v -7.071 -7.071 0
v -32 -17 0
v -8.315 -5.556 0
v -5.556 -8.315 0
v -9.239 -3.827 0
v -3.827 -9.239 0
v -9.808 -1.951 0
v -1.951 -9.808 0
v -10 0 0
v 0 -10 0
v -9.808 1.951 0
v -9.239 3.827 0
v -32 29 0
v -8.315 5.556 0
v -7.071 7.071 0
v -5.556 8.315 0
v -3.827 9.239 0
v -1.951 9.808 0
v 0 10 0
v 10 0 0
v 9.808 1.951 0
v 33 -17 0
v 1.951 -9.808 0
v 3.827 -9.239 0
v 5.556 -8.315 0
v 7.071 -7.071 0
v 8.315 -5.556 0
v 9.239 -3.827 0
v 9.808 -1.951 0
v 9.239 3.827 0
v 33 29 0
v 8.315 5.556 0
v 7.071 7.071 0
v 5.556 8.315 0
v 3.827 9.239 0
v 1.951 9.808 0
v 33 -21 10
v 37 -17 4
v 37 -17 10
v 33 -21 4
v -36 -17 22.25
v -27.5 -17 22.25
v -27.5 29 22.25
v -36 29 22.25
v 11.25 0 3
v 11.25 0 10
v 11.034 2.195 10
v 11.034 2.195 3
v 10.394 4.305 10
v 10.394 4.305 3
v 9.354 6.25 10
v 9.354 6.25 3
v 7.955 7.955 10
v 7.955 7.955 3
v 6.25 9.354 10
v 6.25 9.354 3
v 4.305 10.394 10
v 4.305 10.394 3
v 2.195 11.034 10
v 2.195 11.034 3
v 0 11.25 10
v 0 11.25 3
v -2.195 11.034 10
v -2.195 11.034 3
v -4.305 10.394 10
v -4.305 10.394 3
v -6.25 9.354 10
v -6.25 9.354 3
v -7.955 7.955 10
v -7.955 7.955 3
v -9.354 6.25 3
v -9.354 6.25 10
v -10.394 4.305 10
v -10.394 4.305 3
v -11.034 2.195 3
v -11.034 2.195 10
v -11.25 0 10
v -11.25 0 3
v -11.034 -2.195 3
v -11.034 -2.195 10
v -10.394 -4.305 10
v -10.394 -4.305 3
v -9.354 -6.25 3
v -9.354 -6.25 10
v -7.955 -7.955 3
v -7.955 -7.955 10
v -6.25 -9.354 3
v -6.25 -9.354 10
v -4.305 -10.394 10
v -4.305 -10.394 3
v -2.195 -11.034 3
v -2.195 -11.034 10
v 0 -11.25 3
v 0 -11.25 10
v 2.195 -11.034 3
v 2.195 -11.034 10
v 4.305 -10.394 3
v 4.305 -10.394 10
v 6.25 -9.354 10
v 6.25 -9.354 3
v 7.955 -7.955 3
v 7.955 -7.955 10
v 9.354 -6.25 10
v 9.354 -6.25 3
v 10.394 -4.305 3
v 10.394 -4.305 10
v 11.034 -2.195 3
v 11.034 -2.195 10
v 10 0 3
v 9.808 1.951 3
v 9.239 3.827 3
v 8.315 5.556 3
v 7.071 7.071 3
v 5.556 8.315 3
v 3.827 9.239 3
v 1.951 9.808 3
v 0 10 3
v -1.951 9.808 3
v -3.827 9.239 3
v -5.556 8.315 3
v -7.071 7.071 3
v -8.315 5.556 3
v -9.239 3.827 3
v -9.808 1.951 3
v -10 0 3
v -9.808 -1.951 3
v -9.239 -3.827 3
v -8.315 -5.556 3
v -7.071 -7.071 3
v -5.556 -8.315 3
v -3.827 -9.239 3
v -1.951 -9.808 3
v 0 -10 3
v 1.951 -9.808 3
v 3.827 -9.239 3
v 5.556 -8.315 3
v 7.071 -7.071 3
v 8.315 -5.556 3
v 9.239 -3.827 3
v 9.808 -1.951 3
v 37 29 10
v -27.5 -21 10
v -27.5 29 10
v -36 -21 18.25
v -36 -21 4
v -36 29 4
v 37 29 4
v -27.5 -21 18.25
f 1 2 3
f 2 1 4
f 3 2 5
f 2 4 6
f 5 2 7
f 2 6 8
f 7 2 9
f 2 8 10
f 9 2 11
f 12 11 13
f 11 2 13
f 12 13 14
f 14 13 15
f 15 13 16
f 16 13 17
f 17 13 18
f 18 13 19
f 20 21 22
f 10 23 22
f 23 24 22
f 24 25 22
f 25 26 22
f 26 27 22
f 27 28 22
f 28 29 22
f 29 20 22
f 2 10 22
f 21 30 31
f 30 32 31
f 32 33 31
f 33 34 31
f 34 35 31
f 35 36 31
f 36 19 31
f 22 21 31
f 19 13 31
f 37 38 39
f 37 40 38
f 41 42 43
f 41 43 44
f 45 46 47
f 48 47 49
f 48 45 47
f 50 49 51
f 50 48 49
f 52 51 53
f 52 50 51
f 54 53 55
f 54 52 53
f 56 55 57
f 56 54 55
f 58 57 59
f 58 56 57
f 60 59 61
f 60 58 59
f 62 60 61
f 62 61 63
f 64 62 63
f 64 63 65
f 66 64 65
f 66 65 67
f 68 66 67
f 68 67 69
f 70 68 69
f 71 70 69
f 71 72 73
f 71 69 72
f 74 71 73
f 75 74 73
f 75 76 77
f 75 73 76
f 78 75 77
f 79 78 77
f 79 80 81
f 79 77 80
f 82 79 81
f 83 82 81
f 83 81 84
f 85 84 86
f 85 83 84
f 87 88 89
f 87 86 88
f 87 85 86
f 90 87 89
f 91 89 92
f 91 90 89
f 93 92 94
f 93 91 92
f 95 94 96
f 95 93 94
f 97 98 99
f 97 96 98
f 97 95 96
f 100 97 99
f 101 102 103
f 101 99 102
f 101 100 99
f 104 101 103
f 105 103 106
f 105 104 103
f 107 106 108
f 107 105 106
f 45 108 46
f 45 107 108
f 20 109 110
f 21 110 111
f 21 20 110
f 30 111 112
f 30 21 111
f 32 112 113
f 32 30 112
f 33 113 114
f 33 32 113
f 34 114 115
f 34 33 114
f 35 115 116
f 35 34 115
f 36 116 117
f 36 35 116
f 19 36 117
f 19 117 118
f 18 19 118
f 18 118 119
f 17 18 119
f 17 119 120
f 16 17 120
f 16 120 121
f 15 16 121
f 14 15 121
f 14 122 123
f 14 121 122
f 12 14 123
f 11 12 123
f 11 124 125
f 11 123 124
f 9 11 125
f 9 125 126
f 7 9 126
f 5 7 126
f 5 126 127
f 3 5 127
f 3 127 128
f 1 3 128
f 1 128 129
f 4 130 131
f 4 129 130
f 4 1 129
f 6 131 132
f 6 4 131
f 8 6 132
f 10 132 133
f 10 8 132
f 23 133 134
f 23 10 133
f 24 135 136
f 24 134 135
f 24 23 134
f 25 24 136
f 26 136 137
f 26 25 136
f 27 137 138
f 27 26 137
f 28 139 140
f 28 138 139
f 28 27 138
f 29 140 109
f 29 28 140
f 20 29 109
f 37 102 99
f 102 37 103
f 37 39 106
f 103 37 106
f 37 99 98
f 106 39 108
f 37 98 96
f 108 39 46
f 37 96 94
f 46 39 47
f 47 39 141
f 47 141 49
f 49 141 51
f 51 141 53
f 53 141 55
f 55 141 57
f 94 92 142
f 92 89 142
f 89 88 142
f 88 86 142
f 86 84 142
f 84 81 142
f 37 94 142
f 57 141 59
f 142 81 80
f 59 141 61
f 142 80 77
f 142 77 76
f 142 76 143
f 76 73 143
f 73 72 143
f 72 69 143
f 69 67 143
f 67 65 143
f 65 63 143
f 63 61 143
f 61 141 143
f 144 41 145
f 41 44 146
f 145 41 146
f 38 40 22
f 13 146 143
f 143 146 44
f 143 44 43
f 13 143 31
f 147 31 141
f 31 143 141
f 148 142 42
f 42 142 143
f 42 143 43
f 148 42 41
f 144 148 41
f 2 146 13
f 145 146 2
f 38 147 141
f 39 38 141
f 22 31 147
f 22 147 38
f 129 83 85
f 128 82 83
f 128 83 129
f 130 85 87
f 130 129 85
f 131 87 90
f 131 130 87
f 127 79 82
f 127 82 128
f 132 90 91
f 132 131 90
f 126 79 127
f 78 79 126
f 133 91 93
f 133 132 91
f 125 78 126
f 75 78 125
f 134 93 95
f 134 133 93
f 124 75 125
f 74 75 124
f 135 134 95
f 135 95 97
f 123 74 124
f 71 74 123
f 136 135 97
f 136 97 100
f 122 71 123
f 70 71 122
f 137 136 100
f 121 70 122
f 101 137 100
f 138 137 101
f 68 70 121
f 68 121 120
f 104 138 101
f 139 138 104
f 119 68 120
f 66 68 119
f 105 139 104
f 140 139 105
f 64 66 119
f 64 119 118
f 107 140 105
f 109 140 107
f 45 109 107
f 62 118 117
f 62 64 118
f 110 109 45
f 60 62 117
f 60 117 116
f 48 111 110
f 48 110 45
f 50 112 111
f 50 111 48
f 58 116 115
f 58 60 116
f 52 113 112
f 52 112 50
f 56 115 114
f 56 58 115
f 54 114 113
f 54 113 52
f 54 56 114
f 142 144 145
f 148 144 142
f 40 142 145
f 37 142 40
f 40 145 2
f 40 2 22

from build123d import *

# Parameters (mm, degrees)
PAD007_DEPTH    = 50
SKETCH009_R     = 10
POCKET001_DEPTH = 22.251
SKETCH010_R     = 11.25
POCKET002_DEPTH = 19.251
CHAMFER001_SIZE = 4


with BuildPart() as part:
    # Sketch008 (on Face1 of Binder002) → Pad007 (new body)
    with BuildSketch(Plane.XZ.offset(-29)):
        Polygon((37, 0), (37, 10), (-27.5, 10), (-27.5, 22.25), (-36, 22.25), (-36, 0), align=None)
    extrude(amount=PAD007_DEPTH)

    # Sketch009 → Pocket001 (cut, through all)
    with BuildSketch(Plane.XY):
        Circle(SKETCH009_R)
    extrude(amount=POCKET001_DEPTH, mode=Mode.SUBTRACT)

    # Sketch010 → Pocket002 (cut, through all)
    with BuildSketch(Plane.XY.offset(3)):
        Circle(SKETCH010_R)
    extrude(amount=POCKET002_DEPTH, mode=Mode.SUBTRACT)

    # Chamfer001
    chamfer001_edges = [part.edges().sort_by_distance(p)[0] for p in [
        (-31.75, -21, 22.25),
        (37, -21, 5),
        (-36, 4, 0),
        (0.5, -21, 0),
        (37, 4, 0),
    ]]
    chamfer(chamfer001_edges, length=CHAMFER001_SIZE)


solid = part.part
